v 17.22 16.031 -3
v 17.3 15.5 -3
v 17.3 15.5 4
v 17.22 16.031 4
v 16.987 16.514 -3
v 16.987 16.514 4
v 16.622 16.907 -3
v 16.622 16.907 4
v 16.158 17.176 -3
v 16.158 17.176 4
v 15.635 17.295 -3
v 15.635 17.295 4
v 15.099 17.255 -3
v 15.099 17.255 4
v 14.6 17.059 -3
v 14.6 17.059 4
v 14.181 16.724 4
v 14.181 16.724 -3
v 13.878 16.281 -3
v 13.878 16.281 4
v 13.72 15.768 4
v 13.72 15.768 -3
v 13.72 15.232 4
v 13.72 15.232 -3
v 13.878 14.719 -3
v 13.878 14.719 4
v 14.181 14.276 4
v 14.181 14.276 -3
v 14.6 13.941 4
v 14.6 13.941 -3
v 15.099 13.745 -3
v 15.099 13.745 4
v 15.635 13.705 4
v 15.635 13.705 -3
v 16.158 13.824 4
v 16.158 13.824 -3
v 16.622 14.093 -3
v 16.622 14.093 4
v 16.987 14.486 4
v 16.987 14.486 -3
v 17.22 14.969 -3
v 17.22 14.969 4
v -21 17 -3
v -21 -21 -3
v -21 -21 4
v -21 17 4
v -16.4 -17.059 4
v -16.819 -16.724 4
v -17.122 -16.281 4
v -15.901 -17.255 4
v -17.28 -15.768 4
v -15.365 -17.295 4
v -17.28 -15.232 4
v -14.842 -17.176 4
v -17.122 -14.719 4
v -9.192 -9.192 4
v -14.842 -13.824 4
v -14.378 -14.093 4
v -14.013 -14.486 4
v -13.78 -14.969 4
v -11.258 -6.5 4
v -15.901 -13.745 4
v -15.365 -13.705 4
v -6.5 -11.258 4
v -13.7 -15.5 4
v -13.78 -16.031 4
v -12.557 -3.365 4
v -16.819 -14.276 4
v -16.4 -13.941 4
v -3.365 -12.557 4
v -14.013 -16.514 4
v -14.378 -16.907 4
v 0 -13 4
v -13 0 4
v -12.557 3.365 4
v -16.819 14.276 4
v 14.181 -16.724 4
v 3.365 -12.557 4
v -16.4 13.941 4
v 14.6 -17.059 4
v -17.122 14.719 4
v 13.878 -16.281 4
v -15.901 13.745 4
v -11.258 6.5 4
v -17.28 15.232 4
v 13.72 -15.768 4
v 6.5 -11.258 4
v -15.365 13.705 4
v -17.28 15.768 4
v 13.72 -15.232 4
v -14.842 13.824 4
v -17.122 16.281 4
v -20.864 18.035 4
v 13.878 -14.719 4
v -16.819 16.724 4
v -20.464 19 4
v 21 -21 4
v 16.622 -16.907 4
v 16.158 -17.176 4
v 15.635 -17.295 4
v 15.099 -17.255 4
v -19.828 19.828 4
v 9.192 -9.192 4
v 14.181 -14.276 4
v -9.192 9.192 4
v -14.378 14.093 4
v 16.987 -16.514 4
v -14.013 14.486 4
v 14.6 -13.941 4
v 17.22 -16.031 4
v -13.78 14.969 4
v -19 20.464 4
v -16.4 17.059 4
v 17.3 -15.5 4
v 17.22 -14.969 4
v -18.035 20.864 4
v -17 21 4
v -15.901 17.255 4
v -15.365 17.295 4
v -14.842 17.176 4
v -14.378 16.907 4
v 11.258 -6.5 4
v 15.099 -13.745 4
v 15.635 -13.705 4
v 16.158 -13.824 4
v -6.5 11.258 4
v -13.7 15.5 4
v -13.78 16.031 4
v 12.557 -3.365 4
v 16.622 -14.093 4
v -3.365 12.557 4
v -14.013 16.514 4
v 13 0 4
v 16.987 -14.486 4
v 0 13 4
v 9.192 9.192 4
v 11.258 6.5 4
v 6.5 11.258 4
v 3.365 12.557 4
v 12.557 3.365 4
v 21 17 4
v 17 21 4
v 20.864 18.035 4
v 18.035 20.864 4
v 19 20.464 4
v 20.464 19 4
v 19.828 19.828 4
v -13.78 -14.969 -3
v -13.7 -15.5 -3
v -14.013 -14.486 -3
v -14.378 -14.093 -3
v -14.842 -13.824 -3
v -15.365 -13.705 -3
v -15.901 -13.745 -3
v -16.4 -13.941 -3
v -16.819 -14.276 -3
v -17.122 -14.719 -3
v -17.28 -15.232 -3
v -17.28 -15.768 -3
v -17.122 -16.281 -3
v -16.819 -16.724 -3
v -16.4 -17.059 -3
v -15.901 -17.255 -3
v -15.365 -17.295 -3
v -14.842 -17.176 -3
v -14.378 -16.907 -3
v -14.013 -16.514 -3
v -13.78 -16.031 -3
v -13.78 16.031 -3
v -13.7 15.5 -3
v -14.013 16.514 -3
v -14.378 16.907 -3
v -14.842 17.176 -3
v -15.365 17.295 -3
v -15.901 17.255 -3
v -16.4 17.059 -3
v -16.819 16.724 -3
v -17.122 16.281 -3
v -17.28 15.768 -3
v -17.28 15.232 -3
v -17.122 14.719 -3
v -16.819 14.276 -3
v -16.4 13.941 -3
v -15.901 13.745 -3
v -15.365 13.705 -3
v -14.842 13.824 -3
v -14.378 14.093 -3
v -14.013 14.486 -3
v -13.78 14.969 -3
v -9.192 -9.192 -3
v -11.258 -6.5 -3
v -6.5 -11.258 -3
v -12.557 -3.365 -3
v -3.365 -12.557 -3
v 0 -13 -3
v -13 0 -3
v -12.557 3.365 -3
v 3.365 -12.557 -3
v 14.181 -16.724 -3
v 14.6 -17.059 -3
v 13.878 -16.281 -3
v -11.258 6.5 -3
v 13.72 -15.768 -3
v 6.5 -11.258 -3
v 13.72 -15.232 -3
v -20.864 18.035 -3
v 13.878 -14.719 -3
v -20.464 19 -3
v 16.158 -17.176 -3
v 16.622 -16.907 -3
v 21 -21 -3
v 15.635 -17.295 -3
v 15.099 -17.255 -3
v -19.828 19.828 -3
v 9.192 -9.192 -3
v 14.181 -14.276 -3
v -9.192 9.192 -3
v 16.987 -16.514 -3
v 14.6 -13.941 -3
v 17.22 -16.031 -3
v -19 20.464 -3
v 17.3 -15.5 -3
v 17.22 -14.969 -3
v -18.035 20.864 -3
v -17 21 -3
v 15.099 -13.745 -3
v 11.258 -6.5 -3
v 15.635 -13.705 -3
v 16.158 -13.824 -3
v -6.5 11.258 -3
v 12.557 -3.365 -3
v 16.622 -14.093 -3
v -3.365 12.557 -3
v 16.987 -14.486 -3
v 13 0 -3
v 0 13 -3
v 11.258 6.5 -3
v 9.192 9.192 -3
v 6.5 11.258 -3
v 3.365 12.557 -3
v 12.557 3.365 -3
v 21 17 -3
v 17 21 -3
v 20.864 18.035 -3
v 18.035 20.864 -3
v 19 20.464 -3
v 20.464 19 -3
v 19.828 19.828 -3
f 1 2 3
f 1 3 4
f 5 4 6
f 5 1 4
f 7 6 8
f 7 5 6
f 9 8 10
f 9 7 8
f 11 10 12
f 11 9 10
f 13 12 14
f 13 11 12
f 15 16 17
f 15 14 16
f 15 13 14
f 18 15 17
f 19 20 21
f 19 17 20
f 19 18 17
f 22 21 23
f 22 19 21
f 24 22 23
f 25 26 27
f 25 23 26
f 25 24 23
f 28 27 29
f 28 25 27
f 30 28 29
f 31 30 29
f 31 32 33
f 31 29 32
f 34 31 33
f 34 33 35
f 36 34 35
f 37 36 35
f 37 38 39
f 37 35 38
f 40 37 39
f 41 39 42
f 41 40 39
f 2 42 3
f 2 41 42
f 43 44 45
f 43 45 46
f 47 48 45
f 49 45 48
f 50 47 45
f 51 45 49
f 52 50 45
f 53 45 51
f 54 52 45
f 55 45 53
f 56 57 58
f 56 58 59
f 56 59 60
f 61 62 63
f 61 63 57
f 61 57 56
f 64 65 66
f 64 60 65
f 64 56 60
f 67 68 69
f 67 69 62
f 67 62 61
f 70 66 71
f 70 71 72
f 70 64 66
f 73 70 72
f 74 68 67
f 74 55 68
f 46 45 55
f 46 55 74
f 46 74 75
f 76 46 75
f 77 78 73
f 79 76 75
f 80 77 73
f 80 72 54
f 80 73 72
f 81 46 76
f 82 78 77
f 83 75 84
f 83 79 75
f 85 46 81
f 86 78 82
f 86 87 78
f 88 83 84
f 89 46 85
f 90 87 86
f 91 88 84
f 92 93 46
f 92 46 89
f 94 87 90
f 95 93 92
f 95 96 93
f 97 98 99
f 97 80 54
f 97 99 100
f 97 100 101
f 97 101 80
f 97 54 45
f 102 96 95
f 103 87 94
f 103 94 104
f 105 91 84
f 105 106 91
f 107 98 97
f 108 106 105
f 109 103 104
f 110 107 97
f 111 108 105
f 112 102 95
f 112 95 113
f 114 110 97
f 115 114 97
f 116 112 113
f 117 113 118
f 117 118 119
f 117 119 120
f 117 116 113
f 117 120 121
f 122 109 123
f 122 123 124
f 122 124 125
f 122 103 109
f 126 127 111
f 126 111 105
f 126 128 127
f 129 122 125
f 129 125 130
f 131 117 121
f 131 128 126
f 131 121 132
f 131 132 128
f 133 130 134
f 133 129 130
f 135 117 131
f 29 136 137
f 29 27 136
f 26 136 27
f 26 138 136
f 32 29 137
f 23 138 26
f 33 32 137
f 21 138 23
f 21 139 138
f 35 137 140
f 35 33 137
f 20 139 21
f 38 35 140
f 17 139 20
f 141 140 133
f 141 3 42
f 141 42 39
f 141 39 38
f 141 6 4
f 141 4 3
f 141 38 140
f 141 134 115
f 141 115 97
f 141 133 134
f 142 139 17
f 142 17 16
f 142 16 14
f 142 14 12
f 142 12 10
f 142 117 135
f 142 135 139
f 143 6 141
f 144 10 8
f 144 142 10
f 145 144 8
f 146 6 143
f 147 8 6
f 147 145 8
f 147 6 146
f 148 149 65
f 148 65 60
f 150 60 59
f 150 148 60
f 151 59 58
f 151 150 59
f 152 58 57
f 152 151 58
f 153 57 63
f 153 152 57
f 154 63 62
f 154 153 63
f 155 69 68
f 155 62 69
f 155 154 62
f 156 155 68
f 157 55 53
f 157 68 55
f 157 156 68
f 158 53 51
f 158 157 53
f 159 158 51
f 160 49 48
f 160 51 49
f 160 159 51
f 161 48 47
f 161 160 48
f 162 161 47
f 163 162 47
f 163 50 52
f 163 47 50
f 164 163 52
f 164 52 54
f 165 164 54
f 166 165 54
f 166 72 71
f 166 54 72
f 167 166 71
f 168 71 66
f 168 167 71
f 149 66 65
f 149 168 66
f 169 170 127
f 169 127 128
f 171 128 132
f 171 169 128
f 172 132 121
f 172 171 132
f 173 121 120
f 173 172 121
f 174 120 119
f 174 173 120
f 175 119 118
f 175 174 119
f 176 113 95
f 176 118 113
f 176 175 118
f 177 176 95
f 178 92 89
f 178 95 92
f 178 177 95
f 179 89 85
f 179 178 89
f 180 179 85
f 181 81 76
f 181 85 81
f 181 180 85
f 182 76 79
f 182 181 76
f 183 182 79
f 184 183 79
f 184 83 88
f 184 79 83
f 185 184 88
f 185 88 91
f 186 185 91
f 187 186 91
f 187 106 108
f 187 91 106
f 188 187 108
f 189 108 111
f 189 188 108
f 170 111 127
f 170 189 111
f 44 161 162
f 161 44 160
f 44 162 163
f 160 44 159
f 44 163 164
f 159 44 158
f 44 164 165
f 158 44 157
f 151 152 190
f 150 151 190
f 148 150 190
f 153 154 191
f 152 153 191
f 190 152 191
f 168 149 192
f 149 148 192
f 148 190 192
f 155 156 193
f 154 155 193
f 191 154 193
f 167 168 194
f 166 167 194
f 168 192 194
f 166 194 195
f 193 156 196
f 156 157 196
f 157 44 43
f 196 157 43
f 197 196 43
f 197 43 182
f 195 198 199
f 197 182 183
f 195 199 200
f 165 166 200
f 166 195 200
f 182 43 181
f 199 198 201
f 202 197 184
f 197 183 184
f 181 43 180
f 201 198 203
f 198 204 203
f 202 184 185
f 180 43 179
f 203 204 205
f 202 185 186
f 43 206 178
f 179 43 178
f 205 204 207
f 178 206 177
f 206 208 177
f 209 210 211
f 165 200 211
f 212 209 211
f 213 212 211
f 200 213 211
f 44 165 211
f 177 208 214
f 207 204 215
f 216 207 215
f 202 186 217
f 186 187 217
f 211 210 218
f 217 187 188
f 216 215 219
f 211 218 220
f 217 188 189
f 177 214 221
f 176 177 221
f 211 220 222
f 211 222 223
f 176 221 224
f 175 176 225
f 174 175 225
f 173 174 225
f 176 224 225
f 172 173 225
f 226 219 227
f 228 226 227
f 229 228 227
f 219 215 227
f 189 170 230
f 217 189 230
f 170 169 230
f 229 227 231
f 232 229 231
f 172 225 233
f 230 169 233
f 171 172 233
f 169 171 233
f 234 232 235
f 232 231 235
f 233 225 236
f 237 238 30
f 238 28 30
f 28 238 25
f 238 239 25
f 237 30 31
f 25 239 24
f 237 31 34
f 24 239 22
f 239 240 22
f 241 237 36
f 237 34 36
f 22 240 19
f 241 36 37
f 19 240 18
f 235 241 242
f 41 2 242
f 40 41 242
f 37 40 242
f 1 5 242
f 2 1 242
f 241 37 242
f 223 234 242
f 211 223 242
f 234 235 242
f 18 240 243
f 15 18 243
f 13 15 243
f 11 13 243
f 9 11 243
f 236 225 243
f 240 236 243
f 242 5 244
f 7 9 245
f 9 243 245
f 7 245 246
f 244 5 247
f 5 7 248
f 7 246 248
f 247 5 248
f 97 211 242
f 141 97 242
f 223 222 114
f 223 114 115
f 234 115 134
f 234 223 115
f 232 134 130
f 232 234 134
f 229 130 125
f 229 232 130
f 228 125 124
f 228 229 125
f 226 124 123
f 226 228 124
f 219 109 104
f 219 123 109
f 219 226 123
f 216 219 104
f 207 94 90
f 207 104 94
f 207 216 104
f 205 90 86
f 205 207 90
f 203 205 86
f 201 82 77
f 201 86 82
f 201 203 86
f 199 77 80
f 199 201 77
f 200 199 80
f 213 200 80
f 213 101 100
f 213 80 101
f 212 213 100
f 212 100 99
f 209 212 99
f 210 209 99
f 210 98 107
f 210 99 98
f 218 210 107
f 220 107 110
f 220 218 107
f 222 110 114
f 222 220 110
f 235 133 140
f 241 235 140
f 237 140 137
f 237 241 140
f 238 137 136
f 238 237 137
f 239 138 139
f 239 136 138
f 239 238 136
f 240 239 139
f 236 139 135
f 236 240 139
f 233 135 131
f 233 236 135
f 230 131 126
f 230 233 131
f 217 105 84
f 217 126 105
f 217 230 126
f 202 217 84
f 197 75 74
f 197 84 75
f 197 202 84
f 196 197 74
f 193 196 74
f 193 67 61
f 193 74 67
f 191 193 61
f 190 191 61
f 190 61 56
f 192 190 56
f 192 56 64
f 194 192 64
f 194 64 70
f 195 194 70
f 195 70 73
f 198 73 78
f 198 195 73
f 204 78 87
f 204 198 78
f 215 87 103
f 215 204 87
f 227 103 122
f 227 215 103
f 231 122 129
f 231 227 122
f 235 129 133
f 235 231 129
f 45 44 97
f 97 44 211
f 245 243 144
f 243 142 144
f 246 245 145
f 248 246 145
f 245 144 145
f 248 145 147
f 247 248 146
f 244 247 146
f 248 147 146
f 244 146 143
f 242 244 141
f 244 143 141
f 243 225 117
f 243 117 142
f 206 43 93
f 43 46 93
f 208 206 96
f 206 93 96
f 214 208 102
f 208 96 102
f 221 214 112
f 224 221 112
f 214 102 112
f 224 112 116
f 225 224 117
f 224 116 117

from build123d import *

# Parameters (mm, degrees)
CYLINDER001_R     = 1.8
CYLINDER001_DEPTH = 20
ARRAY_X_COUNT     = 2
ARRAY_X_PITCH     = 31
ARRAY_Y_COUNT     = 2
ARRAY_Y_PITCH     = 31
CYLINDER_R        = 13
CYLINDER_DEPTH    = 20
BOX_W             = 42
BOX_H             = 42
BOX_DEPTH         = 7
FILLET001_R       = 4


with BuildPart() as motor_attachment_hole_array:
    # Cylinder001 → Cylinder001 (new body)
    with BuildSketch(Plane(origin=(-15.5, -15.5, 0), x_dir=(1, 0, 0), z_dir=(0, 0, 1))):
        Circle(CYLINDER001_R)
    extrude(amount=CYLINDER001_DEPTH)

    # Array X: motor attachment hole array ×2


with BuildPart() as motor_attachment_hole_array_1:
    add(motor_attachment_hole_array.part)
    with Locations(*[(i * ARRAY_X_PITCH, 0, 0) for i in range(1, ARRAY_X_COUNT)]):
        add(motor_attachment_hole_array.part)

    # Array Y: motor attachment hole array ×2


with BuildPart() as motor_attachment_hole_array_2:
    add(motor_attachment_hole_array_1.part)
    with Locations(*[(0, i * ARRAY_Y_PITCH, 0) for i in range(1, ARRAY_Y_COUNT)]):
        add(motor_attachment_hole_array_1.part)


with BuildPart() as fusion001:
    # Cylinder → Cylinder (new body)
    with BuildSketch(Plane.XY):
        Circle(CYLINDER_R)
    extrude(amount=CYLINDER_DEPTH)

    # Fusion001: union motor attachment hole array
    add(motor_attachment_hole_array_2.part)


with BuildPart() as fusion001_1:
    # Fusion001 placement: moved
    add(fusion001.part.moved(Location((0, 0, -5))))


with BuildPart() as motor_side_fillet:
    # Box → Box (new body)
    with BuildSketch(Plane(origin=(-21, -21, -3), x_dir=(1, 0, 0), z_dir=(0, 0, 1))):
        with Locations((21, 21)):
            Rectangle(BOX_W, BOX_H)
    extrude(amount=BOX_DEPTH)

    # Cut002: cut Fusion001
    add(fusion001_1.part, mode=Mode.SUBTRACT)

    # Fillet001
    fillet001_edges = [motor_side_fillet.edges().sort_by_distance(p)[0] for p in [
        (-21, 21, 0.5),
        (21, 21, 0.5),
    ]]
    fillet(fillet001_edges, radius=FILLET001_R)


solid = motor_side_fillet.part
